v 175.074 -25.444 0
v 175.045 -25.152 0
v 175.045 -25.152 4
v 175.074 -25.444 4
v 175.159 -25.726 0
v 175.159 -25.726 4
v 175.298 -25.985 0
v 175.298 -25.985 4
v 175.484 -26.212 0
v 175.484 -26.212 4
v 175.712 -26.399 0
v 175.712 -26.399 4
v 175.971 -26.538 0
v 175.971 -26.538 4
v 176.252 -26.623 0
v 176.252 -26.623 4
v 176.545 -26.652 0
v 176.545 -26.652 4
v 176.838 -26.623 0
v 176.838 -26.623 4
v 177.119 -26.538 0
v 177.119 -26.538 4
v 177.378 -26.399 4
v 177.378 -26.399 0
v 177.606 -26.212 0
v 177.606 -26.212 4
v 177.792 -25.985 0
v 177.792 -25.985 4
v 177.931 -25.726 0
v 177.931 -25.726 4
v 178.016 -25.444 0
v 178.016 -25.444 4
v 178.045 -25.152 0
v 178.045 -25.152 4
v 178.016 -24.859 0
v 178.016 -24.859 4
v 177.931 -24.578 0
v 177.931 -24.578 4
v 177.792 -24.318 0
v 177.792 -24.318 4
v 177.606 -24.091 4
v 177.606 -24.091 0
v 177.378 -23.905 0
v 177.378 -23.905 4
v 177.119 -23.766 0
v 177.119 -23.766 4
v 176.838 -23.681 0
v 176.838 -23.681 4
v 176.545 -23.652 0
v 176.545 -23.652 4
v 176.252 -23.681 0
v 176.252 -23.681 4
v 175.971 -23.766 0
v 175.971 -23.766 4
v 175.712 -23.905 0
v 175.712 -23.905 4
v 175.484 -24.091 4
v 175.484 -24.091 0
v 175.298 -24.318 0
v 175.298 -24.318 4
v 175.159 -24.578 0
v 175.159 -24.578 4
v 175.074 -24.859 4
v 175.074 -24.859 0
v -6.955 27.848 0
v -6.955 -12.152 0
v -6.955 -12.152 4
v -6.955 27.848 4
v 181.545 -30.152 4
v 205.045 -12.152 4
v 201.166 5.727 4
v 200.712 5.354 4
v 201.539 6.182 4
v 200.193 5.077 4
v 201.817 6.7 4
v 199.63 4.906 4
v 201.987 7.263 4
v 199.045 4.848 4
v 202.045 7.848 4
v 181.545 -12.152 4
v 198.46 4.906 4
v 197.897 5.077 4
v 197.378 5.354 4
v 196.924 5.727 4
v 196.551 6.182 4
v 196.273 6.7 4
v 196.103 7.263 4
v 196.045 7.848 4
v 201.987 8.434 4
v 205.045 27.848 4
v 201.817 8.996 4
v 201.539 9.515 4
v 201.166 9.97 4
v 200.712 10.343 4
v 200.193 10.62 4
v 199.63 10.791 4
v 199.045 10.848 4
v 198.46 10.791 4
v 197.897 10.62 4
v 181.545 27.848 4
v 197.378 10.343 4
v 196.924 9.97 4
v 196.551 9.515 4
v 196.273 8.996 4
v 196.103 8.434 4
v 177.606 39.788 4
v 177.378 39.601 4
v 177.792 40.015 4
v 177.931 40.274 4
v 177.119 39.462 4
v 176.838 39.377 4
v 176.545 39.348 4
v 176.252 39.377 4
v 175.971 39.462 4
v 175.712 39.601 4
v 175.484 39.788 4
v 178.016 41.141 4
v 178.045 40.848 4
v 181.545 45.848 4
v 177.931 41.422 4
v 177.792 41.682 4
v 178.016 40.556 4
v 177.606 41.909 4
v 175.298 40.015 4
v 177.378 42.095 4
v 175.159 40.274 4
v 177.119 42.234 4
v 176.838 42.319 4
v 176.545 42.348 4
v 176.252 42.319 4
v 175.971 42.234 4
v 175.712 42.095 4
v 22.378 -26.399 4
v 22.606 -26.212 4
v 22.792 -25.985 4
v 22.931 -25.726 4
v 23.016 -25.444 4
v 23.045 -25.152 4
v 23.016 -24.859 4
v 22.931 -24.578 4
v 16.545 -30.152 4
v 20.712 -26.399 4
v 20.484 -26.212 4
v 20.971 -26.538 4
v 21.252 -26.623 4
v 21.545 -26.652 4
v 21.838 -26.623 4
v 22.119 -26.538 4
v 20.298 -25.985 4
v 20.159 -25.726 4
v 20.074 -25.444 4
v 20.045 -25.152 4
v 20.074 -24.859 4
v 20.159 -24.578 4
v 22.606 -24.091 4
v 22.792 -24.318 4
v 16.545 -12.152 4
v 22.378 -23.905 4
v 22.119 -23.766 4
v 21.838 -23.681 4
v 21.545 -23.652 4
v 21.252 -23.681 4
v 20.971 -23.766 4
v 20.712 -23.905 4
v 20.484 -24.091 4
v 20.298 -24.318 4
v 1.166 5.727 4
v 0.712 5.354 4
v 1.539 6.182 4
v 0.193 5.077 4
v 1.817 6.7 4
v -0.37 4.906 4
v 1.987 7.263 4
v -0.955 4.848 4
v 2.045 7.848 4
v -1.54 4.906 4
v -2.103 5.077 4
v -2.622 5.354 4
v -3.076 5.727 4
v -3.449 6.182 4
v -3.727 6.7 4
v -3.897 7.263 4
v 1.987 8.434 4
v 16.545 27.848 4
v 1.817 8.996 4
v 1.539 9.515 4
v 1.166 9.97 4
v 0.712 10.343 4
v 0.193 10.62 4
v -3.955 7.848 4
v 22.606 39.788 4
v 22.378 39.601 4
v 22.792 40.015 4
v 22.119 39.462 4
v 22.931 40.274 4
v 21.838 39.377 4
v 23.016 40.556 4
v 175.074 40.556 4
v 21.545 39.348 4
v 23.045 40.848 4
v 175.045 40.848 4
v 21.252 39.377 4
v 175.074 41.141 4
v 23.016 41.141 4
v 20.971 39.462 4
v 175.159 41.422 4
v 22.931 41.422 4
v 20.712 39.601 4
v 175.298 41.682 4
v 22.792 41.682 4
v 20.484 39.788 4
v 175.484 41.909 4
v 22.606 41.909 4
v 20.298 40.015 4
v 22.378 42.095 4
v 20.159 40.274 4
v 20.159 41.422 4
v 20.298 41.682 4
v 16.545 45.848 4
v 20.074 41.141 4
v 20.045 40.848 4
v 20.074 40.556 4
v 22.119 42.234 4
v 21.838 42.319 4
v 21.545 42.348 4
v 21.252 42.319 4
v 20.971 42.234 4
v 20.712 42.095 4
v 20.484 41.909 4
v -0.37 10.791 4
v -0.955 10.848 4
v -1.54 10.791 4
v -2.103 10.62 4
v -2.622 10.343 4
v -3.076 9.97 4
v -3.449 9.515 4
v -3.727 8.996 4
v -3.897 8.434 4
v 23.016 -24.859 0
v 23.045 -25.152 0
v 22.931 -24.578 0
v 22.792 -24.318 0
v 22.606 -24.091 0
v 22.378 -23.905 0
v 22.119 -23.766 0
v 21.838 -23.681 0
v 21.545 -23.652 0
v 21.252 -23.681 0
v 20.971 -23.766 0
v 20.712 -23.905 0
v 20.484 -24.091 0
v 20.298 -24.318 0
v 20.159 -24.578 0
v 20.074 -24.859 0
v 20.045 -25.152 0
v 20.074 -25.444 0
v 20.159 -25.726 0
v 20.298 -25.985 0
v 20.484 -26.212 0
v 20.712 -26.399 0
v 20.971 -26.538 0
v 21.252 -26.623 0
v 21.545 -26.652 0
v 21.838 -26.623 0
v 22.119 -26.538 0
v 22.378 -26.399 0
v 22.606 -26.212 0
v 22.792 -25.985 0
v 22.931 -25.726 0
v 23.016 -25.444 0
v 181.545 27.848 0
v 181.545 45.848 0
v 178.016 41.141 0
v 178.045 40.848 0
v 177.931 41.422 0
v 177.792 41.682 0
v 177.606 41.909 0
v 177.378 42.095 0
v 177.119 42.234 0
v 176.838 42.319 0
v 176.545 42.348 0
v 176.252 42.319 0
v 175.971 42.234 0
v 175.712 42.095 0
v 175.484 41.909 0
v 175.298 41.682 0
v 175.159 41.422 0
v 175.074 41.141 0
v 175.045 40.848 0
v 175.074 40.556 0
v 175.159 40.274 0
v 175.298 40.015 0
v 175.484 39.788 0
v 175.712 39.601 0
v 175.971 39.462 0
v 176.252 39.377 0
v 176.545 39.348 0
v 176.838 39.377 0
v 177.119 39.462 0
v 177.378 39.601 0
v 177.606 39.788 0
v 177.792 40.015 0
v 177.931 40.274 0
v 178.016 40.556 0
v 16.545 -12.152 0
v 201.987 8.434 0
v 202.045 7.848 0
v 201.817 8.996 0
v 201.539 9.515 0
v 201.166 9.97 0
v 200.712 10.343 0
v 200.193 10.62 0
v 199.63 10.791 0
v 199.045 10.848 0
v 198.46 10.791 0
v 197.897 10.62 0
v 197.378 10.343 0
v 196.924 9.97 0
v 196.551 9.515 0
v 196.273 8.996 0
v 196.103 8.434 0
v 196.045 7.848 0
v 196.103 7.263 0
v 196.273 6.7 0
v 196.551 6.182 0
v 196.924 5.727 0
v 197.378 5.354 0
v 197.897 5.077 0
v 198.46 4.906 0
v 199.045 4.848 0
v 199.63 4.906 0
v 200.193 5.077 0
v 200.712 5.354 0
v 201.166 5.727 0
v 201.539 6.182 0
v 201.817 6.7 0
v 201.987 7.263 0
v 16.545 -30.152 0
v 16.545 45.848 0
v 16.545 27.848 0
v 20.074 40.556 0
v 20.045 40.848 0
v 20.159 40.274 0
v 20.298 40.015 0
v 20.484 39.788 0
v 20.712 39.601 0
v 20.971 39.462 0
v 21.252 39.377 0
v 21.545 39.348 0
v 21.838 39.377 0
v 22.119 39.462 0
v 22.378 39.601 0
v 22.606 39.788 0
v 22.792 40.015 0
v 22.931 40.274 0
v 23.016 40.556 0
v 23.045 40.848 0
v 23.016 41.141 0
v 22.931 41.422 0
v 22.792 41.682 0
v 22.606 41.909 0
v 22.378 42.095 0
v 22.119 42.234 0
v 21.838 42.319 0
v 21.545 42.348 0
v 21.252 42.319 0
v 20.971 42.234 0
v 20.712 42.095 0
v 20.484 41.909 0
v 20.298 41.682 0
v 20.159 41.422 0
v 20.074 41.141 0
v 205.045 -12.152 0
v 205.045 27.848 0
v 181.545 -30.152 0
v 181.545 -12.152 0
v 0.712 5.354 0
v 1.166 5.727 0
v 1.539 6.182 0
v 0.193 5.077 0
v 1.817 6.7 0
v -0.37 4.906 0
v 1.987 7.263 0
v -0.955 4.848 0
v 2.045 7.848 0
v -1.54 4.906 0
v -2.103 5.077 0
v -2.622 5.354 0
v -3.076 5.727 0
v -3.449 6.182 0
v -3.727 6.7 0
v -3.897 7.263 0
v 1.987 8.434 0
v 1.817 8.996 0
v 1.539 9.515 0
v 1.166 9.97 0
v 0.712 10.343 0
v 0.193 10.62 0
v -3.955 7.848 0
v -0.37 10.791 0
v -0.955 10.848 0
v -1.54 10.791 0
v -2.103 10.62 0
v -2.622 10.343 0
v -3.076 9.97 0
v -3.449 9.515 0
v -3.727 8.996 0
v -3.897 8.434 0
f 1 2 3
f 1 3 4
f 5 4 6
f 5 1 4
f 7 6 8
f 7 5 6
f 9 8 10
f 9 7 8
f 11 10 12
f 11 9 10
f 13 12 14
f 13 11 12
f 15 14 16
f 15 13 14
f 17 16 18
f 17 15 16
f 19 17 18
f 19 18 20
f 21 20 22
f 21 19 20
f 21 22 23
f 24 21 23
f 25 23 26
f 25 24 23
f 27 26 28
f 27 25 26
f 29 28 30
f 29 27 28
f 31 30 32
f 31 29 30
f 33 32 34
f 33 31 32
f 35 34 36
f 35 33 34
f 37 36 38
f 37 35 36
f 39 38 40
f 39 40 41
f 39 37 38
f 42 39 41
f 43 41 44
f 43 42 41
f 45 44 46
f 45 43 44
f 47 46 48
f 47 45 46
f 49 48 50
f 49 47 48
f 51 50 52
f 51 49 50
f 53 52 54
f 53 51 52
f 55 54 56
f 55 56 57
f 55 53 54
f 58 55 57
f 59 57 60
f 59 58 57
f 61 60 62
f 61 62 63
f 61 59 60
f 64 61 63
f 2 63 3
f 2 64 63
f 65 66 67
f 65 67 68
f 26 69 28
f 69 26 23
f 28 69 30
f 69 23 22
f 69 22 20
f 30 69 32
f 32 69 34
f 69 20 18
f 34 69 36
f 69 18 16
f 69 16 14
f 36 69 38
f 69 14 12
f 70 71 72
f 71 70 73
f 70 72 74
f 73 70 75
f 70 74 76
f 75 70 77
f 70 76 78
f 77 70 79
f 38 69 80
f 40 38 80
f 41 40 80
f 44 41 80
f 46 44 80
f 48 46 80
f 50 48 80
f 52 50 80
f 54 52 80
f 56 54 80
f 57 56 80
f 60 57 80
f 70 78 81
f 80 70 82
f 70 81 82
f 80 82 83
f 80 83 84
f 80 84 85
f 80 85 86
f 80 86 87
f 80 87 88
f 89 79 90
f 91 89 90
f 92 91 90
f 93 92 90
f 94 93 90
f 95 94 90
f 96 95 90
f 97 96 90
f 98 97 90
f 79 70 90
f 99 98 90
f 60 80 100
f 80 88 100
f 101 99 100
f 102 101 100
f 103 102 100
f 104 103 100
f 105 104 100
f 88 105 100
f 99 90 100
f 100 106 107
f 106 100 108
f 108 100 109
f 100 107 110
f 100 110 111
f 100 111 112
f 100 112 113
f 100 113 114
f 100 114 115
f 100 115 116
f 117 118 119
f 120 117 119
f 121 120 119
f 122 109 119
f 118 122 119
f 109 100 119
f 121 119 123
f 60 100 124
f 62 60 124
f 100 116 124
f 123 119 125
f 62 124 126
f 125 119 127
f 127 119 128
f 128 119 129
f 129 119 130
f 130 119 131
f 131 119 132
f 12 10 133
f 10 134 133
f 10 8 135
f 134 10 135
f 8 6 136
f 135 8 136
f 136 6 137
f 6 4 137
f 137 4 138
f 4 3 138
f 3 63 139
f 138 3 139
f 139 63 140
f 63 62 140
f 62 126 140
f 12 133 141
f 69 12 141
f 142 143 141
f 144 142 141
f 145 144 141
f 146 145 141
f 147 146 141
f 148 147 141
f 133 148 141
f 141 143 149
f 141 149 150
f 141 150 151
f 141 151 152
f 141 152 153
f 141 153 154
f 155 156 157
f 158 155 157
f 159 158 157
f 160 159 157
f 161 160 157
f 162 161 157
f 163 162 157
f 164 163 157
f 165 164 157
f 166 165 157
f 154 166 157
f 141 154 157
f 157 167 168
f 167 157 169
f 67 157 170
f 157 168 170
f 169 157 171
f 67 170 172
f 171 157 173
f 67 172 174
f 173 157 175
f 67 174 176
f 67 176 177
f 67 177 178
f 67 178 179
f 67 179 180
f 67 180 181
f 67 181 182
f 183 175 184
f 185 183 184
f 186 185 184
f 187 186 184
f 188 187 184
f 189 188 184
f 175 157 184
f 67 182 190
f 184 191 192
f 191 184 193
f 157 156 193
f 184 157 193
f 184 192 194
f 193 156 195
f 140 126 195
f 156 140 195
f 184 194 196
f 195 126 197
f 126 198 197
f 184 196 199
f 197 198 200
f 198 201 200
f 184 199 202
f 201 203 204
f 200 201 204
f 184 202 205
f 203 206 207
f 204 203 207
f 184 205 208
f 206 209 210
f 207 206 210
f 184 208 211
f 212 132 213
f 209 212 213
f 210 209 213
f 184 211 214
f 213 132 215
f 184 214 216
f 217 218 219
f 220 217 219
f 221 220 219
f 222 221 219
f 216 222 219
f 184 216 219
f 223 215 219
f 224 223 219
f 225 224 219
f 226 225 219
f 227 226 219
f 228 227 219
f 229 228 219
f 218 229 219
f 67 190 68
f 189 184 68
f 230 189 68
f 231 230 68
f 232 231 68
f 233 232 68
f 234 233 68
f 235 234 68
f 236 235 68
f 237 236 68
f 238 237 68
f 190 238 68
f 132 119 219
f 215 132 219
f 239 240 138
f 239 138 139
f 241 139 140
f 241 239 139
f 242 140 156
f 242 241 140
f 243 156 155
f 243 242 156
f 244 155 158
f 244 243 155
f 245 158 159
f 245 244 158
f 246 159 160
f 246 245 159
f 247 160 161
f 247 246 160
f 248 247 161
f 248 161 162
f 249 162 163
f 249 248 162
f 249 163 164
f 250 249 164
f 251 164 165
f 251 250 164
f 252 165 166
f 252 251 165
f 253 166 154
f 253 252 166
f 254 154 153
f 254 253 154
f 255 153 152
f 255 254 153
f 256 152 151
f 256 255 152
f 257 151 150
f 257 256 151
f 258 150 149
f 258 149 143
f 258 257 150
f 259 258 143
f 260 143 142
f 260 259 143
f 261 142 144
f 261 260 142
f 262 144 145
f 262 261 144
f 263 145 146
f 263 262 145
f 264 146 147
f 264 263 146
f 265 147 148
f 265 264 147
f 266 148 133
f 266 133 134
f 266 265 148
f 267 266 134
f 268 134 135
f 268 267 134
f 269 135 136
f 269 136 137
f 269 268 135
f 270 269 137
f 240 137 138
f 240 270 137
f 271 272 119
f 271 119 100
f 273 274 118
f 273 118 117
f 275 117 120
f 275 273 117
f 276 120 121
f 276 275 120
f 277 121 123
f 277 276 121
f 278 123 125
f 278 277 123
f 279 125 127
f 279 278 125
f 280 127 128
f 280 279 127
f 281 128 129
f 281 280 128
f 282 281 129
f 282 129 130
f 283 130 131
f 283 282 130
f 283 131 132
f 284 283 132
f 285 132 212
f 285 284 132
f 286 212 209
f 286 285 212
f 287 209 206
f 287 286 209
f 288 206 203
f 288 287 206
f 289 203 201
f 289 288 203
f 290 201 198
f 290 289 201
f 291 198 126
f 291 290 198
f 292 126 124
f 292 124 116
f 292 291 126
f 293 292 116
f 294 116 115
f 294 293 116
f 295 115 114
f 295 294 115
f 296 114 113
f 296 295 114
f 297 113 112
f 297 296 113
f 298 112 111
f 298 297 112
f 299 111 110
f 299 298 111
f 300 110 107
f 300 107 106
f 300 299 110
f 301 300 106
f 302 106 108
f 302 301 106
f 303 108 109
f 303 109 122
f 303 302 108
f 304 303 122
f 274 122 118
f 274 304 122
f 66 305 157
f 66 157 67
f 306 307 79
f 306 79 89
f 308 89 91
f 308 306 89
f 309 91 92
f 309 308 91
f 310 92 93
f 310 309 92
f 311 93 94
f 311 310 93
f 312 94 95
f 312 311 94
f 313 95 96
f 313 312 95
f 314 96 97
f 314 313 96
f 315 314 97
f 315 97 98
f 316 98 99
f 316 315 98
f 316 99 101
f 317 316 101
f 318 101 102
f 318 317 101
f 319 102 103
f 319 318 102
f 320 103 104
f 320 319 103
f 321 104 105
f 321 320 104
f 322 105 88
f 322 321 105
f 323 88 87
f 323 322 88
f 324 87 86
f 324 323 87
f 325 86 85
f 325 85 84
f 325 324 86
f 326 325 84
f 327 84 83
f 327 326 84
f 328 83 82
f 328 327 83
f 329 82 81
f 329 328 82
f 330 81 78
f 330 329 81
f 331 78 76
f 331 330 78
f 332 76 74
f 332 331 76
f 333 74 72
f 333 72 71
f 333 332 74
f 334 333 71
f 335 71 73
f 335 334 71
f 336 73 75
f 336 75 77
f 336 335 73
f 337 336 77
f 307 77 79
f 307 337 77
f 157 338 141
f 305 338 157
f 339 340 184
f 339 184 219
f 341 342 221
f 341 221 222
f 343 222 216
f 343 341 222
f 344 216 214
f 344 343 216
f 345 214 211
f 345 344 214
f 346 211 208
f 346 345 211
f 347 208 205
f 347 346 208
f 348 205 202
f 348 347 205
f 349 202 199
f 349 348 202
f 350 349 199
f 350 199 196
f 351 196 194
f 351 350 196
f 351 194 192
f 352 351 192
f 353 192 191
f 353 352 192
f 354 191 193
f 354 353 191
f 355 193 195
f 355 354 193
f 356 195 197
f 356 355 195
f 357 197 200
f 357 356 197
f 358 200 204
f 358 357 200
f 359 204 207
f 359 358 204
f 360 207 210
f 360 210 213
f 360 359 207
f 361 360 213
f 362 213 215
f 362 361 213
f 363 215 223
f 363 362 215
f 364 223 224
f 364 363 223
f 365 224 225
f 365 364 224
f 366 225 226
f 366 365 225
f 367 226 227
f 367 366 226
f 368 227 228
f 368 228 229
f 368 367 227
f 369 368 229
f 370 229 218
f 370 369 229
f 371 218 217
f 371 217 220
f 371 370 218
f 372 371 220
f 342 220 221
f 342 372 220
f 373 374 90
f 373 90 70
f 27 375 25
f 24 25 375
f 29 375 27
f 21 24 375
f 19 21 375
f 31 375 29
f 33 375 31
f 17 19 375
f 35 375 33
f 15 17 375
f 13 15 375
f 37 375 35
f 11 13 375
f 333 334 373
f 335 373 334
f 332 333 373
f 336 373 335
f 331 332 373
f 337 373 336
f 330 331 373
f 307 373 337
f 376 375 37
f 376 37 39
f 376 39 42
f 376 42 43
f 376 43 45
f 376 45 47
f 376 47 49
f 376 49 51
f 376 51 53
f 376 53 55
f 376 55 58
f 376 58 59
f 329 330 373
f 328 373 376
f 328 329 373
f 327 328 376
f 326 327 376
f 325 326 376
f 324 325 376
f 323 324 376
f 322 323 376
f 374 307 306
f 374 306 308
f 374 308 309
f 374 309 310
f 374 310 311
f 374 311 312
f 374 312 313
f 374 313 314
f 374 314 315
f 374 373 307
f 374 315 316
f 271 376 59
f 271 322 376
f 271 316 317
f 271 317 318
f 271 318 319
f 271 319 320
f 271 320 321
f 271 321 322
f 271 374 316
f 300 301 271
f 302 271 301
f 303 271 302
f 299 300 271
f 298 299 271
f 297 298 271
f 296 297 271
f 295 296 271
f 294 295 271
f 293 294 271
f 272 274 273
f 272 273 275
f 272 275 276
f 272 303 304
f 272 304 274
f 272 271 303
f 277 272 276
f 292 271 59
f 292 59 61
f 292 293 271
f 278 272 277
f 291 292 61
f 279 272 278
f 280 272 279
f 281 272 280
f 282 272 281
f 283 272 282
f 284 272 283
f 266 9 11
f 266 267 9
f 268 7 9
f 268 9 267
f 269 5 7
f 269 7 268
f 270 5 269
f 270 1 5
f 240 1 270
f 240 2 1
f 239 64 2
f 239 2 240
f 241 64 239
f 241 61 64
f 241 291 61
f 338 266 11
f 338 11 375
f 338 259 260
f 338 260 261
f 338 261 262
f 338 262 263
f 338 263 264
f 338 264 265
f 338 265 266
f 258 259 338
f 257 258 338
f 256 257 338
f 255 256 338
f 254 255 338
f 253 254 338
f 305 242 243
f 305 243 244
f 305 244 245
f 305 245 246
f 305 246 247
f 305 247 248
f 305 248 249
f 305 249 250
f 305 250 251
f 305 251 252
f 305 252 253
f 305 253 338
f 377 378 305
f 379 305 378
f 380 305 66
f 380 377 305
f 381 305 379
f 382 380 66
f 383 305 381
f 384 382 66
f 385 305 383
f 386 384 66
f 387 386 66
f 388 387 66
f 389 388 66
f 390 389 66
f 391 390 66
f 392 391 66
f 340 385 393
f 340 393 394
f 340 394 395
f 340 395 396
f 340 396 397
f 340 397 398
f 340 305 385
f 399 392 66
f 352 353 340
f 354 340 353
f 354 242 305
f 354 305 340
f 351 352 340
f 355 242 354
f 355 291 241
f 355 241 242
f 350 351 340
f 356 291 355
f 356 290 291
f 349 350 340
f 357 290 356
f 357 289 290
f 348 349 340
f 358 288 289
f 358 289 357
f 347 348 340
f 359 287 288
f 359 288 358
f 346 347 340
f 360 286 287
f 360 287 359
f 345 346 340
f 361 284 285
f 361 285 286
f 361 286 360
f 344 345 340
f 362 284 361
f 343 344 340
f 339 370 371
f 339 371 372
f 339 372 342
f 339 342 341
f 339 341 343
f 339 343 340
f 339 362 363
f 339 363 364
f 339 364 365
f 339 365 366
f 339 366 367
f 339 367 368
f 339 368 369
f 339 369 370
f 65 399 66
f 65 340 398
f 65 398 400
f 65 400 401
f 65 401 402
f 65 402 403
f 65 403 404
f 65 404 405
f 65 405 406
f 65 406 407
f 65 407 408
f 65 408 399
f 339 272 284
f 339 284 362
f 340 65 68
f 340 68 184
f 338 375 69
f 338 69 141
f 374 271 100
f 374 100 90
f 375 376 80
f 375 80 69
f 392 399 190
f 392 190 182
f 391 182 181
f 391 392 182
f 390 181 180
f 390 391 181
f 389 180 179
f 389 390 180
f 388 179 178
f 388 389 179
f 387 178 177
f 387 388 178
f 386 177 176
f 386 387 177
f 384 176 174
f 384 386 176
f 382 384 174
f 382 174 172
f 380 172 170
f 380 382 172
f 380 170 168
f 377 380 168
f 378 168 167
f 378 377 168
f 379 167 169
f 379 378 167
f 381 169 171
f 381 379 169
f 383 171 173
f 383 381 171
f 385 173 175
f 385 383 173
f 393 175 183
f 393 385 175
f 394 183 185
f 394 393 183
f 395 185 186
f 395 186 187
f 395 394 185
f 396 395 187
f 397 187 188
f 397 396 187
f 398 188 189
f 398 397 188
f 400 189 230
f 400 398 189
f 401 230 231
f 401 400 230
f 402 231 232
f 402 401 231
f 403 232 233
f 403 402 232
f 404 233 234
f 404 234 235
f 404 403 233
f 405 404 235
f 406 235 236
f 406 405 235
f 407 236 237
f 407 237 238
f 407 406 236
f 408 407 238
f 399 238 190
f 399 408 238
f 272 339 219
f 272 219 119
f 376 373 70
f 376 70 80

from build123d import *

# Parameters (mm, degrees)
SKETCH1_R           = 1.5
SKETCH1_R_2         = 3
BOSS_EXTRUDE1_DEPTH = 4


with BuildPart() as part:
    # Sketch1 → Boss-Extrude1 (new body)
    with BuildSketch(Plane.XY):
        Polygon((16.544913582, 45.848229773), (181.544913582, 45.848229773), (181.544913582, 27.848229773), (205.044913582, 27.848229773), (205.044913582, -12.151770227), (181.544913582, -12.151770227), (181.544913582, -30.151770227), (16.544913582, -30.151770227), (16.544913582, -12.151770227), (-6.955086418, -12.151770227), (-6.955086418, 27.848229773), (16.544913582, 27.848229773), align=None)
        with Locations((21.544913582, -25.151770227)):
            Circle(SKETCH1_R, mode=Mode.SUBTRACT)
        with Locations(Location((176.544913582, -25.151770227, 0), (0, 0, 180))):
            Circle(SKETCH1_R, mode=Mode.SUBTRACT)
        with Locations((176.544913582, 40.848229773)):
            Circle(SKETCH1_R, mode=Mode.SUBTRACT)
        with Locations(Location((21.544913582, 40.848229773, 0), (0, 0, 180))):
            Circle(SKETCH1_R, mode=Mode.SUBTRACT)
        with Locations((199.044913582, 7.848229773)):
            Circle(SKETCH1_R_2, mode=Mode.SUBTRACT)
        with Locations(Location((-0.955086418, 7.848229773, 0), (0, 0, 180))):
            Circle(SKETCH1_R_2, mode=Mode.SUBTRACT)
    extrude(amount=BOSS_EXTRUDE1_DEPTH)


solid = part.part
